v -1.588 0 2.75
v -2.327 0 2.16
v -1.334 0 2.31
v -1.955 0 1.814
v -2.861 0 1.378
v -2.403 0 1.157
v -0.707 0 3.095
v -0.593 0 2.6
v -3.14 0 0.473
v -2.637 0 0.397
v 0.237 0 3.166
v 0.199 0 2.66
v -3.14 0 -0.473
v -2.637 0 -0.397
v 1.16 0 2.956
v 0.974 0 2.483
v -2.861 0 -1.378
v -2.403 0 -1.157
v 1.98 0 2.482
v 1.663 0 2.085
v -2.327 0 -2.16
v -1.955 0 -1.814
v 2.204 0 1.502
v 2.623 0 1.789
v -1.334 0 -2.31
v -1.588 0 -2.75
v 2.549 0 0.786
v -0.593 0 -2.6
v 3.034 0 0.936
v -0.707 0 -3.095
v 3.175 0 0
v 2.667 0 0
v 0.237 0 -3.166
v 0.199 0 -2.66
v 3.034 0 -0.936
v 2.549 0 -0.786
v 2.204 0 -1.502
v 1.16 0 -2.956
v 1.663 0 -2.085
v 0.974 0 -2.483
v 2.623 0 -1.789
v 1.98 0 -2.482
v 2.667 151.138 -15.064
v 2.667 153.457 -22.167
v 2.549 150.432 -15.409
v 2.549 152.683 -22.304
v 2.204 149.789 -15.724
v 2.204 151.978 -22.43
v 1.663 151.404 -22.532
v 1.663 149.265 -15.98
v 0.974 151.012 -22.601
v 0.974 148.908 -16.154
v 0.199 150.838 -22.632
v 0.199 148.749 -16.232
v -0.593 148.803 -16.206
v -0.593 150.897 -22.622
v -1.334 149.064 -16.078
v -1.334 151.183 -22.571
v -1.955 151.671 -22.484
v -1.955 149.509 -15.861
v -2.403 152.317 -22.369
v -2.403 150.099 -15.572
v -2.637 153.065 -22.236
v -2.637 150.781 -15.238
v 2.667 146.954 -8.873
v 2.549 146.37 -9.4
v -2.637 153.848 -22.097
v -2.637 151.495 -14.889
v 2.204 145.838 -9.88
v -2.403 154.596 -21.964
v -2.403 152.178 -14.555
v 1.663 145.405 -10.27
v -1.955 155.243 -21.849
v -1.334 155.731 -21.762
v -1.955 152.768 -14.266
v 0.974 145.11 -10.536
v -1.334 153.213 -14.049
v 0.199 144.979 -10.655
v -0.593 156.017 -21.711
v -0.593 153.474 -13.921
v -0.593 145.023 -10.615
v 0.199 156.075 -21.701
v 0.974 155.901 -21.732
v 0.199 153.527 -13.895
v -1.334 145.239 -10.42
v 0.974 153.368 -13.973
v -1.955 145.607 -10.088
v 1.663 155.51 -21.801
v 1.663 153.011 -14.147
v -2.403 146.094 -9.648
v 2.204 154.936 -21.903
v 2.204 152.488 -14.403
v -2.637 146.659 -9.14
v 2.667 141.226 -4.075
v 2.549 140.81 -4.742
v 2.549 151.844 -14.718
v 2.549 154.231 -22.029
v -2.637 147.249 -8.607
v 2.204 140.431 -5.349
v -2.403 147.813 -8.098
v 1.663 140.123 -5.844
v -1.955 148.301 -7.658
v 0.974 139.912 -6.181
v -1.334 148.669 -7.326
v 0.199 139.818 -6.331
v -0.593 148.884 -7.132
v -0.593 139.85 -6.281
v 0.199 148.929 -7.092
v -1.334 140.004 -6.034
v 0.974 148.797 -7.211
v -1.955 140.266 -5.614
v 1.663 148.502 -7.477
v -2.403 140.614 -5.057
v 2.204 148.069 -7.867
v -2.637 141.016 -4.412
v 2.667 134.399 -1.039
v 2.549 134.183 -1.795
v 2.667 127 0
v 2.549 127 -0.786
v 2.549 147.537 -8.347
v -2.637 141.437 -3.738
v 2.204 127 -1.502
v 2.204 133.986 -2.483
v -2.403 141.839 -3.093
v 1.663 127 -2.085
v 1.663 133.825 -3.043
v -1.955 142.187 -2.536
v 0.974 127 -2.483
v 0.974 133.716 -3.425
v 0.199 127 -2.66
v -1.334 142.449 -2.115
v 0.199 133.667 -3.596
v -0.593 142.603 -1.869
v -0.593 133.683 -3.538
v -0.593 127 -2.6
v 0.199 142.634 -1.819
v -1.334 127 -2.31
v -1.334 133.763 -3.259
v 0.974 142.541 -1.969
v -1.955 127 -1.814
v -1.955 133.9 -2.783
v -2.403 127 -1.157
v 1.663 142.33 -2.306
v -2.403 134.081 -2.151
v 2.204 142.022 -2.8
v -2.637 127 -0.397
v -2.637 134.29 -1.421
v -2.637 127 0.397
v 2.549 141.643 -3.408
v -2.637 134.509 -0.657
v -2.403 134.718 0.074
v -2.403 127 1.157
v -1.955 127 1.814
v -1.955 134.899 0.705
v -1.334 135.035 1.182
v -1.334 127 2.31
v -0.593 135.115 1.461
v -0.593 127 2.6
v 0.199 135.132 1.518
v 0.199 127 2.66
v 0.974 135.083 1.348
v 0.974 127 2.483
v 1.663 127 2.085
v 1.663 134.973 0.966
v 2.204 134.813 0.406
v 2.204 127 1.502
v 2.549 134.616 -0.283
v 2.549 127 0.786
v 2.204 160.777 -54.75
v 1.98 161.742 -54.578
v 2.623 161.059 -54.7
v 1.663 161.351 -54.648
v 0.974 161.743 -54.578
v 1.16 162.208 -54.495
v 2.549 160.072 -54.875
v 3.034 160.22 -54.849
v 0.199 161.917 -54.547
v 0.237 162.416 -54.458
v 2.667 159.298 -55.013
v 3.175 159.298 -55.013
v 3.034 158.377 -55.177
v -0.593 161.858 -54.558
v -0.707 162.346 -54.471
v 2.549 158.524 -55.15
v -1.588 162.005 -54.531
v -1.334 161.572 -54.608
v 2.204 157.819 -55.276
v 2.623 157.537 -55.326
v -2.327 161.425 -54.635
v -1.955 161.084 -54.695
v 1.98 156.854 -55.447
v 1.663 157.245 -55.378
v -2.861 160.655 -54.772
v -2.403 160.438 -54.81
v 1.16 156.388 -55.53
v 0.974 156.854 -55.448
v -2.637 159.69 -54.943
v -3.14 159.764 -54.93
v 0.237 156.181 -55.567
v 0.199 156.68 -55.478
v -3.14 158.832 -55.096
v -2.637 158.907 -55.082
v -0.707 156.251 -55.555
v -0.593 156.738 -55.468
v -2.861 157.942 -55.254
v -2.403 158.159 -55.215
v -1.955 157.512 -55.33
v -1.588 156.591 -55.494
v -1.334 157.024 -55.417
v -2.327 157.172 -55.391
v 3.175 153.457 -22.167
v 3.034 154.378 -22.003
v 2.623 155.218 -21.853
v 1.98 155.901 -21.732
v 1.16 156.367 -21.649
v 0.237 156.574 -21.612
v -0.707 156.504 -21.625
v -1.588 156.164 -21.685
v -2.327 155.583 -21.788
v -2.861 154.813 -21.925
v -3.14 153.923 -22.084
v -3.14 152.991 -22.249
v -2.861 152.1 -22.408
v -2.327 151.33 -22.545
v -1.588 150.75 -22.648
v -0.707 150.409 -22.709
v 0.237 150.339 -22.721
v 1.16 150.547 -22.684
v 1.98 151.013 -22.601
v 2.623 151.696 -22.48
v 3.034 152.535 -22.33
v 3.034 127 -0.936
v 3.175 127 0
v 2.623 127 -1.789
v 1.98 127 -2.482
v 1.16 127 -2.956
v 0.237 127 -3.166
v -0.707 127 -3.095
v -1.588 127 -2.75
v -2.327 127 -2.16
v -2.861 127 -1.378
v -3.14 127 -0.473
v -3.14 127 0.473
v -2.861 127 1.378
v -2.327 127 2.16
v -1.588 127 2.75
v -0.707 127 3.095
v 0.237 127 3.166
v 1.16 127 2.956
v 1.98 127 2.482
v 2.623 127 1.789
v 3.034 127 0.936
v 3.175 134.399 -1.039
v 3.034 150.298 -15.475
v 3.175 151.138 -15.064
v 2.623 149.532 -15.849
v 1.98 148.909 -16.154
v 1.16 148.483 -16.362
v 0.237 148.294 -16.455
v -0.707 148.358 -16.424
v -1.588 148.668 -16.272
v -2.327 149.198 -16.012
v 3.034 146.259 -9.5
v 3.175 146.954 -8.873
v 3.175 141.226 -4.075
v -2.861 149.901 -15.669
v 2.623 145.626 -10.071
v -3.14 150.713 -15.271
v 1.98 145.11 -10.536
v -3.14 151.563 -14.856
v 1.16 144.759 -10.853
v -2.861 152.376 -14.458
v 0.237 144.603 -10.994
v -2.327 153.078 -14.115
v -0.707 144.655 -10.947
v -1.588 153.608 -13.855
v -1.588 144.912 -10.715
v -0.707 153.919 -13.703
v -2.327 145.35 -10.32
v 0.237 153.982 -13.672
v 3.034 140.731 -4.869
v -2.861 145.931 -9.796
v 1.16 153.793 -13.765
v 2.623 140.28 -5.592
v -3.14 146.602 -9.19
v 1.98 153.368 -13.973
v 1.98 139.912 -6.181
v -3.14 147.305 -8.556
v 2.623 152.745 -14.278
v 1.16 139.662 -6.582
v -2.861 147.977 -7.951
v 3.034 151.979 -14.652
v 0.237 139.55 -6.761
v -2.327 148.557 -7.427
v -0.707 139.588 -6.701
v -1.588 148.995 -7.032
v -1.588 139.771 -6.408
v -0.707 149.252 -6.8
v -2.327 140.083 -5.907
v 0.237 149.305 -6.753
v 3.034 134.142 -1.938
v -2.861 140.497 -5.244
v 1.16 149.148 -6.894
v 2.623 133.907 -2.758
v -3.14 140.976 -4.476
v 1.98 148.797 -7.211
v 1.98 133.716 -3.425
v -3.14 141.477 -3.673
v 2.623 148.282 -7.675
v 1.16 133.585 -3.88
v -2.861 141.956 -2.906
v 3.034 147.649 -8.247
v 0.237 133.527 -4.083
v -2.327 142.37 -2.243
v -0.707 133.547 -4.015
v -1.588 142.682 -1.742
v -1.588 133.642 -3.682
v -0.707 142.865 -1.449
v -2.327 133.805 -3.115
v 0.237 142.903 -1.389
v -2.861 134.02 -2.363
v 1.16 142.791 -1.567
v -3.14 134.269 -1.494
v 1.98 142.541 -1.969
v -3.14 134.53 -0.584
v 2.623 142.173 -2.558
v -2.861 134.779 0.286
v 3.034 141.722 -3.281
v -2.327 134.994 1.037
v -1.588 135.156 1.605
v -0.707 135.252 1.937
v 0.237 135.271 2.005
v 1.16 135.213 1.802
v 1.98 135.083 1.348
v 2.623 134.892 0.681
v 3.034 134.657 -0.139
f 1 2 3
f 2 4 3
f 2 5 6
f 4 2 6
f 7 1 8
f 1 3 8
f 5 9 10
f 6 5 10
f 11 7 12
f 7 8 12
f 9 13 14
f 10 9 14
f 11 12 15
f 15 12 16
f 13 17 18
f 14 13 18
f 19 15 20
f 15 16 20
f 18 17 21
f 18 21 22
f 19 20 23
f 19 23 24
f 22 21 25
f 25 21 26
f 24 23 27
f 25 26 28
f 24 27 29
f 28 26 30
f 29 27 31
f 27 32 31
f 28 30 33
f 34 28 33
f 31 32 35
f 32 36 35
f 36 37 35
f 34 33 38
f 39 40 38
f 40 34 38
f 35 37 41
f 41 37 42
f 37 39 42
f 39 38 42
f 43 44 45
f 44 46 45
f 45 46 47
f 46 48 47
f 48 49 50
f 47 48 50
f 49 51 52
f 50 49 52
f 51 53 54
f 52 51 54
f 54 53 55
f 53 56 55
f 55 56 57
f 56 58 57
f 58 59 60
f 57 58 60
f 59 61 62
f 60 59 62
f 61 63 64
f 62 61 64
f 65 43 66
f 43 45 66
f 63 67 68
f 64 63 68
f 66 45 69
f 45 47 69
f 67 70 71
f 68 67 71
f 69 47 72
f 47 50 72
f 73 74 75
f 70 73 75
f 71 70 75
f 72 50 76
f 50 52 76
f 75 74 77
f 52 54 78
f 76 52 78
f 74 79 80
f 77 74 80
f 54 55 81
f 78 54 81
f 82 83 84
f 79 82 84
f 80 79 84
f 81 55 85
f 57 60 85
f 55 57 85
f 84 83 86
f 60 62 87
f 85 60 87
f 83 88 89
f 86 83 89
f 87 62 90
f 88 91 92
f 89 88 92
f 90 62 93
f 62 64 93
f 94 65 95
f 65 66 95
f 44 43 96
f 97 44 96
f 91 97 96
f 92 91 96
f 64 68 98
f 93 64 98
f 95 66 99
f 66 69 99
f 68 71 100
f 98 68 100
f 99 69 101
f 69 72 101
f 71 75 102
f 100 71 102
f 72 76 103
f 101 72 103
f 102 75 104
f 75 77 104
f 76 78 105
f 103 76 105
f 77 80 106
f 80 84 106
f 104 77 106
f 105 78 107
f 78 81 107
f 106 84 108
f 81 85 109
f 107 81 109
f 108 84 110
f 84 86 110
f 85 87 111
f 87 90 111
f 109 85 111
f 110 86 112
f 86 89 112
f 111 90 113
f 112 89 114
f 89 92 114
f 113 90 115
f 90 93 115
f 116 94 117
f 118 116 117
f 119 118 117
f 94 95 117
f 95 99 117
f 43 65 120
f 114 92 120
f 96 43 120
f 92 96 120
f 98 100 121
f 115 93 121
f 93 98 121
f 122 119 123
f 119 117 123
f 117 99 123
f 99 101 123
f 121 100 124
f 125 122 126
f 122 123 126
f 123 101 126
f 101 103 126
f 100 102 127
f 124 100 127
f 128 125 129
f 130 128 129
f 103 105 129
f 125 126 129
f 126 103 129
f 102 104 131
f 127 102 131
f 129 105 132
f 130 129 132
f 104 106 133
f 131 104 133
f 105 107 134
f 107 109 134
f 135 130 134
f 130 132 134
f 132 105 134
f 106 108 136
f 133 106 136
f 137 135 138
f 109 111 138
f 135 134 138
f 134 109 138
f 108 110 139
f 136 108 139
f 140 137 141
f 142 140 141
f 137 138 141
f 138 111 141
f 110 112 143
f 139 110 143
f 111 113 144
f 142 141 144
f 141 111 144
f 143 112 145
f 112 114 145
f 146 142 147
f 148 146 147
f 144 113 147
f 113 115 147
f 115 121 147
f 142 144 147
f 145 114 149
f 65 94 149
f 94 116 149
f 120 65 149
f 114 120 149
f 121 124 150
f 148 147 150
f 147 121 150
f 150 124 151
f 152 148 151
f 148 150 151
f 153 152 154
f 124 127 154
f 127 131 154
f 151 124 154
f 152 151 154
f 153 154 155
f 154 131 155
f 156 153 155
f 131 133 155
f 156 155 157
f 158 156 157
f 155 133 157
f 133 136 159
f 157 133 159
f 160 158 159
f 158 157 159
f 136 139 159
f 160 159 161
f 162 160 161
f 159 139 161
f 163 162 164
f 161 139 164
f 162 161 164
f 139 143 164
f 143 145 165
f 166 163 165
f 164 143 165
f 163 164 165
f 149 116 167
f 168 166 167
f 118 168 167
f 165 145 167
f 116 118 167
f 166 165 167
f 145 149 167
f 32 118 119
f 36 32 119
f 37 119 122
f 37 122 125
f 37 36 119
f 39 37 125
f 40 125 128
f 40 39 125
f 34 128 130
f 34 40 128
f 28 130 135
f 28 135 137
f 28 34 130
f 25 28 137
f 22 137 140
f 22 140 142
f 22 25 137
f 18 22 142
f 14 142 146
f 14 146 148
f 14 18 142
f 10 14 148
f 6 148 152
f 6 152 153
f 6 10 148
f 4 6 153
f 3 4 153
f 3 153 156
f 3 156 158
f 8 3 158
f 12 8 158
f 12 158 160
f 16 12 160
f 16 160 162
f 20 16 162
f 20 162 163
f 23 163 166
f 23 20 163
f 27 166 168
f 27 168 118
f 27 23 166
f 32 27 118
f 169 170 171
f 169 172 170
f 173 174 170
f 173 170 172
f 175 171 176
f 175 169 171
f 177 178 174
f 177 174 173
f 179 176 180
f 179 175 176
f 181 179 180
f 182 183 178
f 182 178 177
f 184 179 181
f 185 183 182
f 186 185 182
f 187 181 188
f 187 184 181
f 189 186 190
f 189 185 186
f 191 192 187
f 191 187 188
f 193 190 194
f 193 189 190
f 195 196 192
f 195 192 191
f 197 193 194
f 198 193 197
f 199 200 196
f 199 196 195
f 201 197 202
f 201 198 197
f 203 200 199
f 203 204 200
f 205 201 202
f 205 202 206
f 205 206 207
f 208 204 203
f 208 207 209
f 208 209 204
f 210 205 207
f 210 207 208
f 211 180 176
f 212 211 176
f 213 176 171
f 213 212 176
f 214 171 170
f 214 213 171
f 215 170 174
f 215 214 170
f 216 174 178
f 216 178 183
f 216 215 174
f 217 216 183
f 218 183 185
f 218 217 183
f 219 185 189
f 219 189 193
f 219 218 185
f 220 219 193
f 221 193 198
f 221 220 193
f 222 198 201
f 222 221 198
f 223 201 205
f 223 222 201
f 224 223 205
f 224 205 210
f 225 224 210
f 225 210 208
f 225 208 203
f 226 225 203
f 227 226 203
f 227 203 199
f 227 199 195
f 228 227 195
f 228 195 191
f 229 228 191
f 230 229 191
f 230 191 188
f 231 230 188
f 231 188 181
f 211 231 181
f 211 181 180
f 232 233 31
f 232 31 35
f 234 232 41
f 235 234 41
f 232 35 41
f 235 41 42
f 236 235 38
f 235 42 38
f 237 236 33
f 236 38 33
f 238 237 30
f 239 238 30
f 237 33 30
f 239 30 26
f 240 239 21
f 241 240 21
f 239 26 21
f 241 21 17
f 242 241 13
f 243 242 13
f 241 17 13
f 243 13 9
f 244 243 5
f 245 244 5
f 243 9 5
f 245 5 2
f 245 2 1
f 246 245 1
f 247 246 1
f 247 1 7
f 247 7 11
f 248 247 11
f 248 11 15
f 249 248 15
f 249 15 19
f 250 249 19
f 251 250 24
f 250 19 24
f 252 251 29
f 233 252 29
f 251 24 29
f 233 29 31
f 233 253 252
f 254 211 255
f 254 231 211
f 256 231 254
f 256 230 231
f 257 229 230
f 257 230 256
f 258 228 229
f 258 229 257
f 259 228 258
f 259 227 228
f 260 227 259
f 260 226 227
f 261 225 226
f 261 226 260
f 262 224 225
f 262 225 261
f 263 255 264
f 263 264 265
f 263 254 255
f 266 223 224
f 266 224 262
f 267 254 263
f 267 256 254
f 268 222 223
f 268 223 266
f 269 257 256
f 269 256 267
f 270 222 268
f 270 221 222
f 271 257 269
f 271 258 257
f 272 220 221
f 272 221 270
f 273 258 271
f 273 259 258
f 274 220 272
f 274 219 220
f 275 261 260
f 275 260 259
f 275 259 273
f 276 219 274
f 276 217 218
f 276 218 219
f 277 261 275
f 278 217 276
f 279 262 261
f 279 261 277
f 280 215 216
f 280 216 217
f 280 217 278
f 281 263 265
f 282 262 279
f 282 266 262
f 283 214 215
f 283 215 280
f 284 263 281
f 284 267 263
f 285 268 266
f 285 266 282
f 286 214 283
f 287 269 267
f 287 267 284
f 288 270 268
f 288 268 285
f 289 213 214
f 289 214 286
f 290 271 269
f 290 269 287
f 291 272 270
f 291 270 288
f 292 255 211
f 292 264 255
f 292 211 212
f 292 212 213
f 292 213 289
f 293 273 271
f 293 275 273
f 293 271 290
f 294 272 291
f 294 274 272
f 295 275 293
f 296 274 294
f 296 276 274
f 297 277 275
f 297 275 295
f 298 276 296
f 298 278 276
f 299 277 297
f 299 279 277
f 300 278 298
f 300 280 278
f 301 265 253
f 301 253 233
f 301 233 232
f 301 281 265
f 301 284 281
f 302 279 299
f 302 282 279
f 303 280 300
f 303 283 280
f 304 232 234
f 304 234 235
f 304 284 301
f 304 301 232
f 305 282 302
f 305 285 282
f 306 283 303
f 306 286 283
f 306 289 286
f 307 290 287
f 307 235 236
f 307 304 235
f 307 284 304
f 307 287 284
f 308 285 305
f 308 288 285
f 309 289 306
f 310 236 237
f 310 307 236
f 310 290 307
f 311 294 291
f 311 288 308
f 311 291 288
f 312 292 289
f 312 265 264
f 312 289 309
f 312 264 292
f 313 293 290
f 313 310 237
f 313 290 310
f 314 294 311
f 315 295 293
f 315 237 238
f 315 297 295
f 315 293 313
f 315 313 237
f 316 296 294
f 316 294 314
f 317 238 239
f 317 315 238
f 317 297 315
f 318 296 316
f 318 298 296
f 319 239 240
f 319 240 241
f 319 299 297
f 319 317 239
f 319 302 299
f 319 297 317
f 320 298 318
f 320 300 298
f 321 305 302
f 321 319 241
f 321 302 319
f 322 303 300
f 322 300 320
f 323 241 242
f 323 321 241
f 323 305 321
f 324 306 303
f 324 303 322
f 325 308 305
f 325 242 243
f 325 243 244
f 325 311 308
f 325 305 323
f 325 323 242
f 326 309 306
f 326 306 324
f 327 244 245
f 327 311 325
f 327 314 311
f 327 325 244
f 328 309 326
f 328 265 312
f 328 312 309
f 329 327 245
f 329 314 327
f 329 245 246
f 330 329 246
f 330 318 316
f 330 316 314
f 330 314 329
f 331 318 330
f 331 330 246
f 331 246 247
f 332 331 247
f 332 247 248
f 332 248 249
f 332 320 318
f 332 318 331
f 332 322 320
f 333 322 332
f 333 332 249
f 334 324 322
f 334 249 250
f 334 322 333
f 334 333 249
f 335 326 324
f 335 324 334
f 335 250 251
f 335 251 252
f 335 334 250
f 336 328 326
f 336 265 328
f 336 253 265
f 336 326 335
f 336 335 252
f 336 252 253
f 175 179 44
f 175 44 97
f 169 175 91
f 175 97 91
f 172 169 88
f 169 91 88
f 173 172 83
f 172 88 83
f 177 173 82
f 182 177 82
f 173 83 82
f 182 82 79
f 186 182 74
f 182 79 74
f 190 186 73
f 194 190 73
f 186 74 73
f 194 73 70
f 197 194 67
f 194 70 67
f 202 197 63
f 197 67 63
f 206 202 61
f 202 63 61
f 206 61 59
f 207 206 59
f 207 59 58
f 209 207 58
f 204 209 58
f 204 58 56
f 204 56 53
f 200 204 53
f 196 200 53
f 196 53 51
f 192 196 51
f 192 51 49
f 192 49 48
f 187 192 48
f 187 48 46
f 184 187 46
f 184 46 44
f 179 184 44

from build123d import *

# Parameters (mm, degrees)
SKETCH1_R           = 3.175
SKETCH1_R_2         = 2.667
BOSS_EXTRUDE1_DEPTH = 127
SKETCH3_R           = 3.175
SKETCH3_R_2         = 2.667


with BuildPart() as part:
    # Sketch1 → Boss-Extrude1 (new body)
    with BuildSketch(Plane(origin=(0, 0, 0), x_dir=(1, 0, 0), z_dir=(0, 1, 0))):
        Circle(SKETCH1_R)
        Circle(SKETCH1_R_2, mode=Mode.SUBTRACT)
    extrude(amount=BOSS_EXTRUDE1_DEPTH)

    # Sweep1: sweep along a path in Sketch2
    with BuildLine(Plane(origin=(0, 0, 0), x_dir=(0, 0, -1), z_dir=(1, 0, 0))) as sweep1_path:
        Line((55.012797254, 159.298316562), (22.166564651, 153.456678788))
        ThreePointArc((22.166564651, 153.456678788), (6.2740832, 144.25769713), (0, 127))
    # Sketch3 → Sweep1 (sweep)
    with BuildSketch(Plane(origin=(0, 127, 0), x_dir=(1, 0, 0), z_dir=(0, 1, 0))):
        Circle(SKETCH3_R)
        Circle(SKETCH3_R_2, mode=Mode.SUBTRACT)
    sweep(path=sweep1_path.line)


solid = part.part
